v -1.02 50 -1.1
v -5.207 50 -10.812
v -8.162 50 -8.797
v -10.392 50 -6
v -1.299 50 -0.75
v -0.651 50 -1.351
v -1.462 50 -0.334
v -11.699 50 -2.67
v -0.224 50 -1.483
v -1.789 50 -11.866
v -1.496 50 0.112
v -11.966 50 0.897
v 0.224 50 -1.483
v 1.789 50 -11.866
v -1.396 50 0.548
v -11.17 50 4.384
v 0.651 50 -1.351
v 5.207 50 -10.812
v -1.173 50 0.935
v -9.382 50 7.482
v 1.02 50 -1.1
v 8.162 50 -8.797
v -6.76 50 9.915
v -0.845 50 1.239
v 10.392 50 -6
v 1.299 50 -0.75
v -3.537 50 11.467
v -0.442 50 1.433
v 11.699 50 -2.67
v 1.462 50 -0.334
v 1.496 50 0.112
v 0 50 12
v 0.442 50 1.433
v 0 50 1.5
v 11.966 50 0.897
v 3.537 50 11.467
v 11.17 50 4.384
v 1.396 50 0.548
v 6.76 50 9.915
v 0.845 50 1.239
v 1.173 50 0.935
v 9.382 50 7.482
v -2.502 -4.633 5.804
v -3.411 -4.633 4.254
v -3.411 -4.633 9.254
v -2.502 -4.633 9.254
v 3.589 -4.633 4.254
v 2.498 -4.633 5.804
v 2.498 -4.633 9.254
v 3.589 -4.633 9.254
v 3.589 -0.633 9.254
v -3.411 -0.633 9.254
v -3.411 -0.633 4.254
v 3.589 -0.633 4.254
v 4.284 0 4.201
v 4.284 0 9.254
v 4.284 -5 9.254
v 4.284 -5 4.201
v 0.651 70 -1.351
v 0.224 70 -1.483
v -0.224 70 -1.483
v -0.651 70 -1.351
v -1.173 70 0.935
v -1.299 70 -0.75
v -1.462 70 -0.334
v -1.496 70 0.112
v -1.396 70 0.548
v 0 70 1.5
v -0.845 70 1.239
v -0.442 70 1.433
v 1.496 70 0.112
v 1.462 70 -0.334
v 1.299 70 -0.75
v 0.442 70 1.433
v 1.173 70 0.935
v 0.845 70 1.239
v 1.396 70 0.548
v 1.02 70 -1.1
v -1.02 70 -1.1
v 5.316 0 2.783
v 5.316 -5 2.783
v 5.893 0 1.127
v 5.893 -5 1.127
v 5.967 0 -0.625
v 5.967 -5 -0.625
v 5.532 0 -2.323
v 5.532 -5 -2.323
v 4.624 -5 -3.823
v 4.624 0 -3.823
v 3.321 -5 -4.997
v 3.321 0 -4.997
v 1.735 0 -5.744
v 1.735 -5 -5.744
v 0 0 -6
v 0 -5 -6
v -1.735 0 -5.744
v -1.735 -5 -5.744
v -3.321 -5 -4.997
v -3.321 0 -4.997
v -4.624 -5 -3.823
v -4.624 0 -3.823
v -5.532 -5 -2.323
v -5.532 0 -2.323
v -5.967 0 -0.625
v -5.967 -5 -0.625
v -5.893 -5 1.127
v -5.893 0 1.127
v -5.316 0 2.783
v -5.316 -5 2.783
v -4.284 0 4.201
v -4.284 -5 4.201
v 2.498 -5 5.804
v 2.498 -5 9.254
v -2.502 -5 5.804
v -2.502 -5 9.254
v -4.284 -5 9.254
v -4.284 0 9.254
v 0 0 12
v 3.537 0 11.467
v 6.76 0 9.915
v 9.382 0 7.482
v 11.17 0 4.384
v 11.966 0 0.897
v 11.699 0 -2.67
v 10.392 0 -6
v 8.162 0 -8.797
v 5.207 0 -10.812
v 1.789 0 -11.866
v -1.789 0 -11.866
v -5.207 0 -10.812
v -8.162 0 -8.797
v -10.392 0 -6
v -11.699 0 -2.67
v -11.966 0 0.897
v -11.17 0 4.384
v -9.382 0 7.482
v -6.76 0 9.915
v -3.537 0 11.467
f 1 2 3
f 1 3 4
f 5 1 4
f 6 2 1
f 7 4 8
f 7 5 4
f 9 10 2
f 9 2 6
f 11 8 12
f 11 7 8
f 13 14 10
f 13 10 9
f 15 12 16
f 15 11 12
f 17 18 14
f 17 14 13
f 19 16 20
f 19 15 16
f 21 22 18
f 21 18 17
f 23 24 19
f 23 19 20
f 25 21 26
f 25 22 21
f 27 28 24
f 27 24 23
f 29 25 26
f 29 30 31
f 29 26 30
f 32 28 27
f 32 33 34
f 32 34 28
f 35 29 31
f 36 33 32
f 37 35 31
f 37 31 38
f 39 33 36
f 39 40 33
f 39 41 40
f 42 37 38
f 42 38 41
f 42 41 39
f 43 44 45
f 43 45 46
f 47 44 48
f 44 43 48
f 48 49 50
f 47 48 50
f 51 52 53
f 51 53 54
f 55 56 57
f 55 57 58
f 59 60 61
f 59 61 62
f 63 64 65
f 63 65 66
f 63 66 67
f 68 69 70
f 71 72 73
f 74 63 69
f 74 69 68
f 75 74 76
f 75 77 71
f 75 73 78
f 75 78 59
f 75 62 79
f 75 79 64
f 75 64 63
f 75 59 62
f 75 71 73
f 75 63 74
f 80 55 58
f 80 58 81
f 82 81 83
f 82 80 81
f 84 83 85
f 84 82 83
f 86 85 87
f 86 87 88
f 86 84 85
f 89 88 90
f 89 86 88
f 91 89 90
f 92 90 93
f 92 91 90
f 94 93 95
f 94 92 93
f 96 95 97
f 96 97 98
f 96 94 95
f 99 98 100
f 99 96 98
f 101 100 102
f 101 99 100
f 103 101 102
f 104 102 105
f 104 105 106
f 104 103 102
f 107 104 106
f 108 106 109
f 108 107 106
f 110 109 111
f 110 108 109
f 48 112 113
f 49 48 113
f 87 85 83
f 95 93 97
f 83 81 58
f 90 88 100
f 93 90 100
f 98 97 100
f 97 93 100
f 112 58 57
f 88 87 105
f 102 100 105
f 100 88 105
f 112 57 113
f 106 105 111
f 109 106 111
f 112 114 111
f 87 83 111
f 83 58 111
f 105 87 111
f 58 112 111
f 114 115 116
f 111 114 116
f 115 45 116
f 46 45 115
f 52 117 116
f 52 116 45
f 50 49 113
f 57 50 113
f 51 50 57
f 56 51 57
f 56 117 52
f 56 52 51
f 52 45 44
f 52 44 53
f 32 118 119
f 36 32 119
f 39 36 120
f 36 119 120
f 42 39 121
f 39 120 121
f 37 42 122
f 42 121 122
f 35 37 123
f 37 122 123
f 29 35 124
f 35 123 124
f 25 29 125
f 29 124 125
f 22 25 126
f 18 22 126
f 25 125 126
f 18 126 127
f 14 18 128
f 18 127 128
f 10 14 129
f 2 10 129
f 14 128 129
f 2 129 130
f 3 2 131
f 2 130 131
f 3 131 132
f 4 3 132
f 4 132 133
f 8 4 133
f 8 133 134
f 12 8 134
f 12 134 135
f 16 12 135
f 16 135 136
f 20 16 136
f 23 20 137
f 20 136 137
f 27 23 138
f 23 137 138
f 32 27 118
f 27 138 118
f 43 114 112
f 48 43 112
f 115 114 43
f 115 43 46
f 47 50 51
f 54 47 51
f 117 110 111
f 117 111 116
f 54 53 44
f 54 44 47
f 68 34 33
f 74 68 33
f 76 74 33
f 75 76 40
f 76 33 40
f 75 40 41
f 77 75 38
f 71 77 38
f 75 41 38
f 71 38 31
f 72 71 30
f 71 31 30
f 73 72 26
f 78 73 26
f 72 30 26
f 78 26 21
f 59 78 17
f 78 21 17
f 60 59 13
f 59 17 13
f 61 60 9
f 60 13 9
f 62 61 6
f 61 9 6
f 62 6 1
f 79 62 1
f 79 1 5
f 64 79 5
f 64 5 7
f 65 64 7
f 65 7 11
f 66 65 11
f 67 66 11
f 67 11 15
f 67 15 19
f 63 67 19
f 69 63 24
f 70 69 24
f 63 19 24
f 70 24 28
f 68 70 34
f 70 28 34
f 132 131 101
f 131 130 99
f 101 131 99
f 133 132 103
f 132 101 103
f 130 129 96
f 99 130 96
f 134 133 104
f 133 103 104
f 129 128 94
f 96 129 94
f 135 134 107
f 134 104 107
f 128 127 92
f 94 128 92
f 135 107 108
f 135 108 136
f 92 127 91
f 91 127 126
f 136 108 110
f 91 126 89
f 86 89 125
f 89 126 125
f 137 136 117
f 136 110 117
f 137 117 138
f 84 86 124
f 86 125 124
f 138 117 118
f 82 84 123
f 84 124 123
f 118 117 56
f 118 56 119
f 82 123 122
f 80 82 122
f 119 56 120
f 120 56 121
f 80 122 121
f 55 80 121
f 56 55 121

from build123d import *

# Parameters (mm, degrees)
SKETCH1_R           = 12
BOSS_EXTRUDE1_DEPTH = 50
SKETCH2_R           = 1.5
BOSS_EXTRUDE2_DEPTH = 20
BOSS_EXTRUDE3_DEPTH = 5
SKETCH4_W           = 7
SKETCH4_H           = 4
CUT_EXTRUDE1_DEPTH  = 5
SKETCH5_W           = 5
SKETCH5_H           = 3.450611601
CUT_EXTRUDE2_DEPTH  = 0.4


with BuildPart() as part:
    # Sketch1 → Boss-Extrude1 (new body)
    with BuildSketch(Plane(origin=(0, 0, 0), x_dir=(1, 0, 0), z_dir=(0, 1, 0))):
        with Locations(Location((0, 0, 0), (0, 0, 270))):
            Circle(SKETCH1_R)
    extrude(amount=BOSS_EXTRUDE1_DEPTH)

    # Sketch2 → Boss-Extrude2 (add)
    with BuildSketch(Plane(origin=(0, 50, 0), x_dir=(1, 0, 0), z_dir=(0, 1, 0))):
        with Locations(Location((0, 0, 0), (0, 0, 270))):
            Circle(SKETCH2_R)
    extrude(amount=BOSS_EXTRUDE2_DEPTH)

    # Sketch3 → Boss-Extrude3 (add)
    with BuildSketch(Plane.XZ):
        with BuildLine():
            Line((-4.284272991, 4.200595784), (-4.284272991, 9.25435285))
            Line((-4.284272991, 9.25435285), (4.284272991, 9.25435285))
            Line((4.284272991, 9.25435285), (4.284272991, 4.200595784))
            ThreePointArc((4.284272991, 4.200595784), (0, -6), (-4.284272991, 4.200595784))
        make_face()
    extrude(amount=BOSS_EXTRUDE3_DEPTH)

    # Sketch4 → Cut-Extrude1 (cut)
    with BuildSketch(Plane.XY.offset(9.25435285)):
        with Locations((0.08918727, -2.633127674)):
            Rectangle(SKETCH4_W, SKETCH4_H)
    extrude(amount=-CUT_EXTRUDE1_DEPTH, mode=Mode.SUBTRACT)

    # Sketch5 → Cut-Extrude2 (cut)
    with BuildSketch(Plane.XZ.offset(5)):
        with Locations((-0.001847359, 7.52904705)):
            Rectangle(SKETCH5_W, SKETCH5_H)
    extrude(amount=-CUT_EXTRUDE2_DEPTH, mode=Mode.SUBTRACT)


solid = part.part
